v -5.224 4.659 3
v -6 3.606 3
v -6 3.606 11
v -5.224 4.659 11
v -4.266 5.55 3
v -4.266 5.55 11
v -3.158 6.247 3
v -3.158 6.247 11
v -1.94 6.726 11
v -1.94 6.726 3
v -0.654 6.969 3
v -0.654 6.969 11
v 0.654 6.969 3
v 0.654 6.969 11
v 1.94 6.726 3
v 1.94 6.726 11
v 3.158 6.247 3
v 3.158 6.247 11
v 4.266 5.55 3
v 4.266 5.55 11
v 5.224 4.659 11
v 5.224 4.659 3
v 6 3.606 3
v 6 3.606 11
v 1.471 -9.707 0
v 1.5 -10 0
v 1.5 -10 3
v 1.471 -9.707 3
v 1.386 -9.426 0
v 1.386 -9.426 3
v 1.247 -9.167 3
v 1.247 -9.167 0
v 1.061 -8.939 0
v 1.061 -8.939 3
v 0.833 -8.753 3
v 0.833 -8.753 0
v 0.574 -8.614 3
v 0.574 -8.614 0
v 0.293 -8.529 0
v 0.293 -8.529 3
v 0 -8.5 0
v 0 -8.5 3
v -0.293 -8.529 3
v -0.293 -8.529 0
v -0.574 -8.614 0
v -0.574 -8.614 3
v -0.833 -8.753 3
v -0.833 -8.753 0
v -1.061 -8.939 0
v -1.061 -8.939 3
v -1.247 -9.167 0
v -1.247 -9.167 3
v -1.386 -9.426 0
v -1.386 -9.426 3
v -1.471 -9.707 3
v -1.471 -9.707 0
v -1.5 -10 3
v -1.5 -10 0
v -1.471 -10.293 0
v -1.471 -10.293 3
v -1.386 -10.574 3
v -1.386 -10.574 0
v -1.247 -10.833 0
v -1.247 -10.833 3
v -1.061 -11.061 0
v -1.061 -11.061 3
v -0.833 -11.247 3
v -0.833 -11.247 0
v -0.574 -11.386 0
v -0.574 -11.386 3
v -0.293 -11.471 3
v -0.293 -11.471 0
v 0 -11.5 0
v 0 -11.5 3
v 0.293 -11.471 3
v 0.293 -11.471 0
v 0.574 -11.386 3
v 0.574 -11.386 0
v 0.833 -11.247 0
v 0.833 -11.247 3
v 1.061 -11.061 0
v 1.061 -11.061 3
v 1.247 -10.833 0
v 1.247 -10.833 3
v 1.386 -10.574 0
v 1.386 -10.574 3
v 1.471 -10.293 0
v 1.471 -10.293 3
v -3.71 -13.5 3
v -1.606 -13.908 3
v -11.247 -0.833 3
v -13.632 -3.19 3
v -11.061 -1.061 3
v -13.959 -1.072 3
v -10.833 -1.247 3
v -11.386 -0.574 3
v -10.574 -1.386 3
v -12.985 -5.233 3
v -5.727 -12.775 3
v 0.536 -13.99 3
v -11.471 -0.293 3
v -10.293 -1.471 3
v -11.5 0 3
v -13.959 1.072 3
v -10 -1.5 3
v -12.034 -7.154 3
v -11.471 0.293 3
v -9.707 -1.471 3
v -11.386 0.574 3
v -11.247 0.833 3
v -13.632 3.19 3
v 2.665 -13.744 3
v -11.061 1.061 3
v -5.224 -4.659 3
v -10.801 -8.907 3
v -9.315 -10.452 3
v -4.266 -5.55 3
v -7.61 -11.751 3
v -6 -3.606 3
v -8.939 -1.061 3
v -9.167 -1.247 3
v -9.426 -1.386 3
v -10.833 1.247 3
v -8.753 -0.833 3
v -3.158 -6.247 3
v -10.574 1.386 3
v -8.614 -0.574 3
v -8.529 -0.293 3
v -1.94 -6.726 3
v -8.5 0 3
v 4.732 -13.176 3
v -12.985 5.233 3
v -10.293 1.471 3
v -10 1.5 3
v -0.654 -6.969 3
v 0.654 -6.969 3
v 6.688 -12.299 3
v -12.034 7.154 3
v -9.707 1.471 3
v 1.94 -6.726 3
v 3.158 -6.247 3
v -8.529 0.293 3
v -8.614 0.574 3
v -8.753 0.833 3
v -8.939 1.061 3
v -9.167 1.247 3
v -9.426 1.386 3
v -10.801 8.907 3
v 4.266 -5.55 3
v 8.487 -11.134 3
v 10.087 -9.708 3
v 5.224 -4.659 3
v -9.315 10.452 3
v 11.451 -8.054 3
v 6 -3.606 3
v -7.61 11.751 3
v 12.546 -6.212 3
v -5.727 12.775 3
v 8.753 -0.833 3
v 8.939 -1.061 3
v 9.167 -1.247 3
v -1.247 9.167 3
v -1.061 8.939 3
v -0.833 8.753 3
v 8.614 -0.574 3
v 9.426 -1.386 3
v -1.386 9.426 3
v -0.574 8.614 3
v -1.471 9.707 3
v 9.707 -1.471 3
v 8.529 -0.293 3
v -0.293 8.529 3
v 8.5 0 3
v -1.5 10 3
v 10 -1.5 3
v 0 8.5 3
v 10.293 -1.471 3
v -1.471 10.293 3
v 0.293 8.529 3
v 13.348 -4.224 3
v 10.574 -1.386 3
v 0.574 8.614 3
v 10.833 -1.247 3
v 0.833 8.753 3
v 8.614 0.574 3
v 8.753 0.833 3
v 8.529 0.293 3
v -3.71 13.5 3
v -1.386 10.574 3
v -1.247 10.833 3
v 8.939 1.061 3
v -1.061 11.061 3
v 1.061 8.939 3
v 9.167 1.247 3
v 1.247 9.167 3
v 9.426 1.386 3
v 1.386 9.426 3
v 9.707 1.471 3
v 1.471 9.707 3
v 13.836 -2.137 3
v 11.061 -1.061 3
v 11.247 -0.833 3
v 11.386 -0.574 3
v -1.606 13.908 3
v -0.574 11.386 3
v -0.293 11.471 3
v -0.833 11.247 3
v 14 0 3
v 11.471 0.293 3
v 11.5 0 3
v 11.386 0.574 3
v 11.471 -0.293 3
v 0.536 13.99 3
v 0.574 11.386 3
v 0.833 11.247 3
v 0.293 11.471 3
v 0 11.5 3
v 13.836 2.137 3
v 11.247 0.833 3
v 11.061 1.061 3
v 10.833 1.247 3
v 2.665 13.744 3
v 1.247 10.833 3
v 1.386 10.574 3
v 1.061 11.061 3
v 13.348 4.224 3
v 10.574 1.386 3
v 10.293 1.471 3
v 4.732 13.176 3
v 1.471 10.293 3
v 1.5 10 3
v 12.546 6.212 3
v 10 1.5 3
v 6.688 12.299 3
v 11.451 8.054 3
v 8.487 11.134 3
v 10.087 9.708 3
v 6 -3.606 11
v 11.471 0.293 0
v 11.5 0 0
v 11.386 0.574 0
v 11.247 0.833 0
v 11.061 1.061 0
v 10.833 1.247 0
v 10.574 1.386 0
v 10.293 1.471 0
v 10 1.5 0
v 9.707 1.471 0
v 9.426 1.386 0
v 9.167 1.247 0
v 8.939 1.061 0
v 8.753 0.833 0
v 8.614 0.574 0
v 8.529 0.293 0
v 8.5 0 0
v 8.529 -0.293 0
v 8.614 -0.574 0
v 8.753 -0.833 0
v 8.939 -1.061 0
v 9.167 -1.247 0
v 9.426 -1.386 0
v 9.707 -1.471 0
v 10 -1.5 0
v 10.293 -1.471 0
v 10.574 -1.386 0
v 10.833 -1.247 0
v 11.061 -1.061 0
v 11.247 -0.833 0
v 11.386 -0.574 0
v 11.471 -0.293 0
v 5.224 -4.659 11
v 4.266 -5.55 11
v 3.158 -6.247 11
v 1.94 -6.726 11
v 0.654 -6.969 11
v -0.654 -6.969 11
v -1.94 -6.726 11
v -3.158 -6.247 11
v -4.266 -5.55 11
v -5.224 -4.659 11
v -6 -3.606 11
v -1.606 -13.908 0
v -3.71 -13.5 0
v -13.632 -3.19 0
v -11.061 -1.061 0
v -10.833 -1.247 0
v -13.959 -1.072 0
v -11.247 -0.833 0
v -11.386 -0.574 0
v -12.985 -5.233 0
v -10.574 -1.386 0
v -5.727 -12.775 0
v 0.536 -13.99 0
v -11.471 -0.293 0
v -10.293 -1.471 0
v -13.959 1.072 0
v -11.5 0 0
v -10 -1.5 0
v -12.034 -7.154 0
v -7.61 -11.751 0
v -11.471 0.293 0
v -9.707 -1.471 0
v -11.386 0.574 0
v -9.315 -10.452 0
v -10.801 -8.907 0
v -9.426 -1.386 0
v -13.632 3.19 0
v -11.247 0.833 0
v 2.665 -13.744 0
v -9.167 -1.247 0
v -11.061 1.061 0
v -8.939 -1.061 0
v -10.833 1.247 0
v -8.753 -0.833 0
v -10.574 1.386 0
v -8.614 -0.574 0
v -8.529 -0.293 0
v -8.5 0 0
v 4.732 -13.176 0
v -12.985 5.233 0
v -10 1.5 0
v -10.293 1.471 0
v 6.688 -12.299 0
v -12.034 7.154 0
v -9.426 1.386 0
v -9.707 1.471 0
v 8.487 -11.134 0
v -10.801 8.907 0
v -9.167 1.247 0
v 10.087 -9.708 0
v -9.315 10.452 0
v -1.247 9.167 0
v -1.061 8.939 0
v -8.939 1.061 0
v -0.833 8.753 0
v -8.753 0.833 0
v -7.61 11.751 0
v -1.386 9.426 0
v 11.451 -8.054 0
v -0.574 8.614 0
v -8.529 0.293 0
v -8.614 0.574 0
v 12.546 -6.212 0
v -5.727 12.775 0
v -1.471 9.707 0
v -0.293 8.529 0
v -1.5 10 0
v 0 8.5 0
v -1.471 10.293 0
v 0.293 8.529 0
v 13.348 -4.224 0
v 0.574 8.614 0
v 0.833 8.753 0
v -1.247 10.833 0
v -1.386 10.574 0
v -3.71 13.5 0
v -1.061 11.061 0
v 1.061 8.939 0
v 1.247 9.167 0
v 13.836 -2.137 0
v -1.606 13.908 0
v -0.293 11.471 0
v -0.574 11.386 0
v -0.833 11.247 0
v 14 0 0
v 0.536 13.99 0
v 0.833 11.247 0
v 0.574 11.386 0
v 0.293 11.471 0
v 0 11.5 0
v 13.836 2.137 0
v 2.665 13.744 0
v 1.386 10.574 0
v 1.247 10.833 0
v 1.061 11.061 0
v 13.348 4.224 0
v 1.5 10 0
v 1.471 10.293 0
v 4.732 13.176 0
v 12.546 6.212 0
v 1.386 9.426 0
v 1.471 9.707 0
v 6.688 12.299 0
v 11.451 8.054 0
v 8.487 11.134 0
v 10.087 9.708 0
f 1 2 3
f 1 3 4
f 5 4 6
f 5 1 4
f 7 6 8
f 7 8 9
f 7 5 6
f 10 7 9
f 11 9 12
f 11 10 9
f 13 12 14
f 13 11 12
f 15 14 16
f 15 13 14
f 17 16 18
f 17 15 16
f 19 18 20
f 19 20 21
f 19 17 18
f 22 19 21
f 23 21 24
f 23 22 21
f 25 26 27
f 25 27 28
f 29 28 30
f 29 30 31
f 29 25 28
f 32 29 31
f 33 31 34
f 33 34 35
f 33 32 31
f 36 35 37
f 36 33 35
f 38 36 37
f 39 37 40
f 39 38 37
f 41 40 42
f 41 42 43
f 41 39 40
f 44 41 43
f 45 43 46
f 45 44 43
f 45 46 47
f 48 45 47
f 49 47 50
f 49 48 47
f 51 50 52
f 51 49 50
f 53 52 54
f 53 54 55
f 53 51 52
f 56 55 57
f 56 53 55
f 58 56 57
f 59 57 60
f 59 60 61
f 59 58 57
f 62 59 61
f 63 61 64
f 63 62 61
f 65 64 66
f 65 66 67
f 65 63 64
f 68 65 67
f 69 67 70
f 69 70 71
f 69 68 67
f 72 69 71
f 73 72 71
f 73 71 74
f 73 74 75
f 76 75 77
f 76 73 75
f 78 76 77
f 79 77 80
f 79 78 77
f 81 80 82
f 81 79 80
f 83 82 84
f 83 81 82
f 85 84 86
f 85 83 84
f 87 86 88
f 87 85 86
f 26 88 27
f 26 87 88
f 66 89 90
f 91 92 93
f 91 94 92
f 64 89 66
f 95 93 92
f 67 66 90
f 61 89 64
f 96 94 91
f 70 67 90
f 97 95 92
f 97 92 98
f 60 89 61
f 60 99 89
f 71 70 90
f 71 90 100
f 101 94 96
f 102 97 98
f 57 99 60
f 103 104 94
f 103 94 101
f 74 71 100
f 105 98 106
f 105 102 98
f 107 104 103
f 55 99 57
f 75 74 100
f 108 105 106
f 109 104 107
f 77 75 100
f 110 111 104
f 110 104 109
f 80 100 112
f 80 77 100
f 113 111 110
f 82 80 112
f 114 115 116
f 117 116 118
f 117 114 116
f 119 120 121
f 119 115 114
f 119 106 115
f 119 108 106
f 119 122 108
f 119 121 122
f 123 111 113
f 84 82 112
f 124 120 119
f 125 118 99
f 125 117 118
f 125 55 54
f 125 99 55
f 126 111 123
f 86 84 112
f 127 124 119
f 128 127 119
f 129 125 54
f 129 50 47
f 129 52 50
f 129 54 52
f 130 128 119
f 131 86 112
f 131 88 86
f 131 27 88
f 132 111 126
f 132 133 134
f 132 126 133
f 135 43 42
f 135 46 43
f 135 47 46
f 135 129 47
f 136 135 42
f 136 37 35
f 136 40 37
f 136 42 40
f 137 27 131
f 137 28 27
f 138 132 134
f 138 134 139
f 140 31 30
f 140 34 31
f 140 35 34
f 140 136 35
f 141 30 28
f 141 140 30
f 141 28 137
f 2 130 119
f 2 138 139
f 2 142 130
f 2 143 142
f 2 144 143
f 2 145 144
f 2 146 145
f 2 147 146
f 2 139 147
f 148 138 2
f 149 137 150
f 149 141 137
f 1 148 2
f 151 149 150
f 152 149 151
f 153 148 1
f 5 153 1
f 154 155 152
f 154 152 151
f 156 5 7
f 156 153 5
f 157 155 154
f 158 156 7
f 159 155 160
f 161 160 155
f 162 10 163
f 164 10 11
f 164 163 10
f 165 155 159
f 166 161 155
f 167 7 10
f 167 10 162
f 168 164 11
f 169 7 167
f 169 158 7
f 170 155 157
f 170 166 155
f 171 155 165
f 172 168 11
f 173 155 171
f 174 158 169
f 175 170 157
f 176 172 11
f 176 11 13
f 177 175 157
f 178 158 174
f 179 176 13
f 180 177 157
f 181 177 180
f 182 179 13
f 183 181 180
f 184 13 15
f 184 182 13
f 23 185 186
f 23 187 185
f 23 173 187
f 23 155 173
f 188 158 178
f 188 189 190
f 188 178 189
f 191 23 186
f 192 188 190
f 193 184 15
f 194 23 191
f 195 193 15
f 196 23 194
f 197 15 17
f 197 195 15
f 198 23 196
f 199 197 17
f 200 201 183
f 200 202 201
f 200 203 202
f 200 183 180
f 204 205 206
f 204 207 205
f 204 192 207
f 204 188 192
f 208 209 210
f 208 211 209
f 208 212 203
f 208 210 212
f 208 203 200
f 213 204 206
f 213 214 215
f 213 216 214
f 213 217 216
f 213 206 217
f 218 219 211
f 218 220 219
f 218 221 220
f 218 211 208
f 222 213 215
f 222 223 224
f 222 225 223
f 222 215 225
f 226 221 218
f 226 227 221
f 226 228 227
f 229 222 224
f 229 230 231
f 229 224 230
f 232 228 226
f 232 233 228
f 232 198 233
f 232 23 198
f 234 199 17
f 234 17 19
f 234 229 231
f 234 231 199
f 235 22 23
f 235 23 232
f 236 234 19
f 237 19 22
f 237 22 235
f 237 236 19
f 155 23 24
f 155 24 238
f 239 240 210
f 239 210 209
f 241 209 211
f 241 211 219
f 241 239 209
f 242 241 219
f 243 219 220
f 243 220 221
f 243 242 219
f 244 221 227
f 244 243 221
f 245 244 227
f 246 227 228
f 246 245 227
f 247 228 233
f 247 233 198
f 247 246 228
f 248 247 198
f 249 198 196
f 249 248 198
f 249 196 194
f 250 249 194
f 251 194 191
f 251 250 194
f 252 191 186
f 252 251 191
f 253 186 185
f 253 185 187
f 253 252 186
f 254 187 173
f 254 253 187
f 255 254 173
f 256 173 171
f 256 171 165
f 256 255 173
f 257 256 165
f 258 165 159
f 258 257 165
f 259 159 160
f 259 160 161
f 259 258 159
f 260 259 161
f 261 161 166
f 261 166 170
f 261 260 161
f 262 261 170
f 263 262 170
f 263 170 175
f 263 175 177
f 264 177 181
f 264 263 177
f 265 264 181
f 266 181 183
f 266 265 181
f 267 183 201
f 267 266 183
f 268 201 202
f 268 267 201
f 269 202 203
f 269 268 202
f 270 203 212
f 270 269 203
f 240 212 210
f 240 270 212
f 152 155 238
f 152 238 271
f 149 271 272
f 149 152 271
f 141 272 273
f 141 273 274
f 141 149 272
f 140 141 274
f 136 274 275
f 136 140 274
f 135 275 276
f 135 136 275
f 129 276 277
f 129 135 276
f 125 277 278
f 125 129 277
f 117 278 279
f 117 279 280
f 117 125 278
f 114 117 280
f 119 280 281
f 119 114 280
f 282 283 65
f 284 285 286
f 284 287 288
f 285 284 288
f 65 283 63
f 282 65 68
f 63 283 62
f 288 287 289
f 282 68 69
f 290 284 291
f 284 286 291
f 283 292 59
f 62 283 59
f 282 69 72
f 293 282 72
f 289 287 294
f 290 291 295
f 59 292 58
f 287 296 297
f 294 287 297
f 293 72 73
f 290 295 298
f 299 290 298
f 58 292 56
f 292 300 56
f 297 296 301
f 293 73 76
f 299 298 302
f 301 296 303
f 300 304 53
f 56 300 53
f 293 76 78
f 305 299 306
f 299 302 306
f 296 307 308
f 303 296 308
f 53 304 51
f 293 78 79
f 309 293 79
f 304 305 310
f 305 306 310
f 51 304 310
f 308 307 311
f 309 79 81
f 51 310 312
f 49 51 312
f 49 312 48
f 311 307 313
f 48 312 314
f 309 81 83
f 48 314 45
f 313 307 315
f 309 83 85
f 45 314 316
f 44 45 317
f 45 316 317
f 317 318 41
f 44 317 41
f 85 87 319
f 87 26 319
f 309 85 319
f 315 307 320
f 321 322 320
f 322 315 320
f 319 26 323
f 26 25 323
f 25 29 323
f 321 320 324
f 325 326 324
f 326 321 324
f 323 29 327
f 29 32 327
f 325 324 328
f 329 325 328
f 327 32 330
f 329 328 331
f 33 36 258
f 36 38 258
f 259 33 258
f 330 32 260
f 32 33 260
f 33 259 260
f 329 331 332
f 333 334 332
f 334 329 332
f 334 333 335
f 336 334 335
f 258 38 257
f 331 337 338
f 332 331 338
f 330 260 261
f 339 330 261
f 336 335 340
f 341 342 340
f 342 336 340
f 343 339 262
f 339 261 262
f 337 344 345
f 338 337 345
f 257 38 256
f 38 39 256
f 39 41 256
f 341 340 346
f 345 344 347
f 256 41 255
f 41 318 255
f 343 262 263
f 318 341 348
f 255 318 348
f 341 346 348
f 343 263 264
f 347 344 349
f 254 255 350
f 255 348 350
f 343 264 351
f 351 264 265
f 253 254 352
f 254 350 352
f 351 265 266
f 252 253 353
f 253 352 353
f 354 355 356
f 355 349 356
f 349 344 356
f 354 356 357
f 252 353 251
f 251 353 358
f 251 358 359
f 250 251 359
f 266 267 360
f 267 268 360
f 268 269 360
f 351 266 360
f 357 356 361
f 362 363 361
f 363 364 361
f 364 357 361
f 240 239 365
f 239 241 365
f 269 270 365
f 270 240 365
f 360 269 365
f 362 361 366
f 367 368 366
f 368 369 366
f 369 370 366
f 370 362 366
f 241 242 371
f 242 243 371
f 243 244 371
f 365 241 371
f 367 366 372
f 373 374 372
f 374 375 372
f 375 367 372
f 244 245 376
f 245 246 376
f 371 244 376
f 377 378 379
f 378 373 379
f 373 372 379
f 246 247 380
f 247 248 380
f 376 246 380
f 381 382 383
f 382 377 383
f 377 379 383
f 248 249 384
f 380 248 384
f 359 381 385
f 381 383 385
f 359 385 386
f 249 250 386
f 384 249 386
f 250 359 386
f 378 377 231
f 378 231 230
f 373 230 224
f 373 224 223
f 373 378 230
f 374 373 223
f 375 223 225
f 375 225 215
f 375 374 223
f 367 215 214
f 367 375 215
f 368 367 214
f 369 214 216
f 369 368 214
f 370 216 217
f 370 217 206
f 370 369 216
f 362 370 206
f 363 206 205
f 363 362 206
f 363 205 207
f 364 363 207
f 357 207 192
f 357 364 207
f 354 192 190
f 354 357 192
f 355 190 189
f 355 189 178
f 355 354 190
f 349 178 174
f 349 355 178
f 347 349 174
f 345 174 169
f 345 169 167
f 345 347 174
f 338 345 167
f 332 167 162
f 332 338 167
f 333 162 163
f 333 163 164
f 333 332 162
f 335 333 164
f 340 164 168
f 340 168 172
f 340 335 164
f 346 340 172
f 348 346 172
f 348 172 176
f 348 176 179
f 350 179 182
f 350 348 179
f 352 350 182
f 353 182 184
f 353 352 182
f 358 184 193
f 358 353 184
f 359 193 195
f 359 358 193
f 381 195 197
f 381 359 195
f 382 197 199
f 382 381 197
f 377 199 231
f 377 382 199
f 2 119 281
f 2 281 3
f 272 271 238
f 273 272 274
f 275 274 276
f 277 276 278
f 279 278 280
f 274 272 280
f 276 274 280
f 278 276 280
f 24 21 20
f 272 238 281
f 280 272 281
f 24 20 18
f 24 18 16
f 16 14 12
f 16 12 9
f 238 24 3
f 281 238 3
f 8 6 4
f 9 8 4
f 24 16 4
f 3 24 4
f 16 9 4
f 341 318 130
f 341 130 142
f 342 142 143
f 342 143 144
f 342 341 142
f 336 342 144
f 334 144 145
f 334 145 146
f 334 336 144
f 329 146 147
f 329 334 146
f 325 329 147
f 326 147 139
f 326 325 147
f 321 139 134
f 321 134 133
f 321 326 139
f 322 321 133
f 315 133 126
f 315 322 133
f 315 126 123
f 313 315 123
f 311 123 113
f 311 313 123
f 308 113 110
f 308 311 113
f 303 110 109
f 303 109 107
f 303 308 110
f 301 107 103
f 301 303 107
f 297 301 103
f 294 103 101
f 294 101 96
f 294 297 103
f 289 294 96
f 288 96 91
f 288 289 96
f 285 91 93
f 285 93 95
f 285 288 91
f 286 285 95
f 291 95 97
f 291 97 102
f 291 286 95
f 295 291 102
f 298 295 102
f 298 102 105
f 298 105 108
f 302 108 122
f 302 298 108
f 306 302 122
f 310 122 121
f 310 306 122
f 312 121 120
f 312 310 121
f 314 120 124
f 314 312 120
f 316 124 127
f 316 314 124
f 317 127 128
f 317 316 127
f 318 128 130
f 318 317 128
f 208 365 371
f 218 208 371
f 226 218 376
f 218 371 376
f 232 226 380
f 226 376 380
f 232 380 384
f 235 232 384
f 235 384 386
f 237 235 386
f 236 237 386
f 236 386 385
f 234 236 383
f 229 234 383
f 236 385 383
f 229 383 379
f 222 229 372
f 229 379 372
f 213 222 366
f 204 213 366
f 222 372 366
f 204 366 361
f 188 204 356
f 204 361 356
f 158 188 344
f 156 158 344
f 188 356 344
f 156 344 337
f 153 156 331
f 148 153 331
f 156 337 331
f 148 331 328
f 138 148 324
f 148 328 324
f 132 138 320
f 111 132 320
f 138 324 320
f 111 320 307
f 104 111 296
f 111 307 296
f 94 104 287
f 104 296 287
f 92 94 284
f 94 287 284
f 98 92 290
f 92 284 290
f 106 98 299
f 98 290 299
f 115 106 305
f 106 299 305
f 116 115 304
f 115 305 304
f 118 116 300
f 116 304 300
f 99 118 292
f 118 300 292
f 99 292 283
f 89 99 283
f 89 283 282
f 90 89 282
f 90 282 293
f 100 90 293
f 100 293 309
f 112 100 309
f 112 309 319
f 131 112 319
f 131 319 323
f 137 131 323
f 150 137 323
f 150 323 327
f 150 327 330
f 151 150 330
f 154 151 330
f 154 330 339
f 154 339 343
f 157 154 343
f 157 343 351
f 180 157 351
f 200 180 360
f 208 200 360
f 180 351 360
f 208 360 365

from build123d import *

# Parameters (mm, degrees)
SKETCH_1_R      = 14
SKETCH_1_R_2    = 1.5
EXTRUDE_1_DEPTH = 3
EXTRUDE_2_DEPTH = 8


with BuildPart() as part:
    # 草图1 → 凸台-拉伸1 (new body)
    with BuildSketch(Plane.XY):
        Circle(SKETCH_1_R)
        with Locations((0, 10)):
            Circle(SKETCH_1_R_2, mode=Mode.SUBTRACT)
        with Locations((10, 0)):
            Circle(SKETCH_1_R_2, mode=Mode.SUBTRACT)
        with Locations((0, -10)):
            Circle(SKETCH_1_R_2, mode=Mode.SUBTRACT)
        with Locations((-10, 0)):
            Circle(SKETCH_1_R_2, mode=Mode.SUBTRACT)
    extrude(amount=EXTRUDE_1_DEPTH)

    # 草图3 → 凸台-拉伸2 (add)
    with BuildSketch(Plane.XY.offset(3)):
        with BuildLine():
            Line((6, 3.605551275), (6, -3.605551275))
            ThreePointArc((6, -3.605551275), (0, -7), (-6, -3.605551275))
            Line((-6, -3.605551275), (-6, 3.605551275))
            ThreePointArc((-6, 3.605551275), (0, 7), (6, 3.605551275))
        make_face()
    extrude(amount=EXTRUDE_2_DEPTH)


solid = part.part
